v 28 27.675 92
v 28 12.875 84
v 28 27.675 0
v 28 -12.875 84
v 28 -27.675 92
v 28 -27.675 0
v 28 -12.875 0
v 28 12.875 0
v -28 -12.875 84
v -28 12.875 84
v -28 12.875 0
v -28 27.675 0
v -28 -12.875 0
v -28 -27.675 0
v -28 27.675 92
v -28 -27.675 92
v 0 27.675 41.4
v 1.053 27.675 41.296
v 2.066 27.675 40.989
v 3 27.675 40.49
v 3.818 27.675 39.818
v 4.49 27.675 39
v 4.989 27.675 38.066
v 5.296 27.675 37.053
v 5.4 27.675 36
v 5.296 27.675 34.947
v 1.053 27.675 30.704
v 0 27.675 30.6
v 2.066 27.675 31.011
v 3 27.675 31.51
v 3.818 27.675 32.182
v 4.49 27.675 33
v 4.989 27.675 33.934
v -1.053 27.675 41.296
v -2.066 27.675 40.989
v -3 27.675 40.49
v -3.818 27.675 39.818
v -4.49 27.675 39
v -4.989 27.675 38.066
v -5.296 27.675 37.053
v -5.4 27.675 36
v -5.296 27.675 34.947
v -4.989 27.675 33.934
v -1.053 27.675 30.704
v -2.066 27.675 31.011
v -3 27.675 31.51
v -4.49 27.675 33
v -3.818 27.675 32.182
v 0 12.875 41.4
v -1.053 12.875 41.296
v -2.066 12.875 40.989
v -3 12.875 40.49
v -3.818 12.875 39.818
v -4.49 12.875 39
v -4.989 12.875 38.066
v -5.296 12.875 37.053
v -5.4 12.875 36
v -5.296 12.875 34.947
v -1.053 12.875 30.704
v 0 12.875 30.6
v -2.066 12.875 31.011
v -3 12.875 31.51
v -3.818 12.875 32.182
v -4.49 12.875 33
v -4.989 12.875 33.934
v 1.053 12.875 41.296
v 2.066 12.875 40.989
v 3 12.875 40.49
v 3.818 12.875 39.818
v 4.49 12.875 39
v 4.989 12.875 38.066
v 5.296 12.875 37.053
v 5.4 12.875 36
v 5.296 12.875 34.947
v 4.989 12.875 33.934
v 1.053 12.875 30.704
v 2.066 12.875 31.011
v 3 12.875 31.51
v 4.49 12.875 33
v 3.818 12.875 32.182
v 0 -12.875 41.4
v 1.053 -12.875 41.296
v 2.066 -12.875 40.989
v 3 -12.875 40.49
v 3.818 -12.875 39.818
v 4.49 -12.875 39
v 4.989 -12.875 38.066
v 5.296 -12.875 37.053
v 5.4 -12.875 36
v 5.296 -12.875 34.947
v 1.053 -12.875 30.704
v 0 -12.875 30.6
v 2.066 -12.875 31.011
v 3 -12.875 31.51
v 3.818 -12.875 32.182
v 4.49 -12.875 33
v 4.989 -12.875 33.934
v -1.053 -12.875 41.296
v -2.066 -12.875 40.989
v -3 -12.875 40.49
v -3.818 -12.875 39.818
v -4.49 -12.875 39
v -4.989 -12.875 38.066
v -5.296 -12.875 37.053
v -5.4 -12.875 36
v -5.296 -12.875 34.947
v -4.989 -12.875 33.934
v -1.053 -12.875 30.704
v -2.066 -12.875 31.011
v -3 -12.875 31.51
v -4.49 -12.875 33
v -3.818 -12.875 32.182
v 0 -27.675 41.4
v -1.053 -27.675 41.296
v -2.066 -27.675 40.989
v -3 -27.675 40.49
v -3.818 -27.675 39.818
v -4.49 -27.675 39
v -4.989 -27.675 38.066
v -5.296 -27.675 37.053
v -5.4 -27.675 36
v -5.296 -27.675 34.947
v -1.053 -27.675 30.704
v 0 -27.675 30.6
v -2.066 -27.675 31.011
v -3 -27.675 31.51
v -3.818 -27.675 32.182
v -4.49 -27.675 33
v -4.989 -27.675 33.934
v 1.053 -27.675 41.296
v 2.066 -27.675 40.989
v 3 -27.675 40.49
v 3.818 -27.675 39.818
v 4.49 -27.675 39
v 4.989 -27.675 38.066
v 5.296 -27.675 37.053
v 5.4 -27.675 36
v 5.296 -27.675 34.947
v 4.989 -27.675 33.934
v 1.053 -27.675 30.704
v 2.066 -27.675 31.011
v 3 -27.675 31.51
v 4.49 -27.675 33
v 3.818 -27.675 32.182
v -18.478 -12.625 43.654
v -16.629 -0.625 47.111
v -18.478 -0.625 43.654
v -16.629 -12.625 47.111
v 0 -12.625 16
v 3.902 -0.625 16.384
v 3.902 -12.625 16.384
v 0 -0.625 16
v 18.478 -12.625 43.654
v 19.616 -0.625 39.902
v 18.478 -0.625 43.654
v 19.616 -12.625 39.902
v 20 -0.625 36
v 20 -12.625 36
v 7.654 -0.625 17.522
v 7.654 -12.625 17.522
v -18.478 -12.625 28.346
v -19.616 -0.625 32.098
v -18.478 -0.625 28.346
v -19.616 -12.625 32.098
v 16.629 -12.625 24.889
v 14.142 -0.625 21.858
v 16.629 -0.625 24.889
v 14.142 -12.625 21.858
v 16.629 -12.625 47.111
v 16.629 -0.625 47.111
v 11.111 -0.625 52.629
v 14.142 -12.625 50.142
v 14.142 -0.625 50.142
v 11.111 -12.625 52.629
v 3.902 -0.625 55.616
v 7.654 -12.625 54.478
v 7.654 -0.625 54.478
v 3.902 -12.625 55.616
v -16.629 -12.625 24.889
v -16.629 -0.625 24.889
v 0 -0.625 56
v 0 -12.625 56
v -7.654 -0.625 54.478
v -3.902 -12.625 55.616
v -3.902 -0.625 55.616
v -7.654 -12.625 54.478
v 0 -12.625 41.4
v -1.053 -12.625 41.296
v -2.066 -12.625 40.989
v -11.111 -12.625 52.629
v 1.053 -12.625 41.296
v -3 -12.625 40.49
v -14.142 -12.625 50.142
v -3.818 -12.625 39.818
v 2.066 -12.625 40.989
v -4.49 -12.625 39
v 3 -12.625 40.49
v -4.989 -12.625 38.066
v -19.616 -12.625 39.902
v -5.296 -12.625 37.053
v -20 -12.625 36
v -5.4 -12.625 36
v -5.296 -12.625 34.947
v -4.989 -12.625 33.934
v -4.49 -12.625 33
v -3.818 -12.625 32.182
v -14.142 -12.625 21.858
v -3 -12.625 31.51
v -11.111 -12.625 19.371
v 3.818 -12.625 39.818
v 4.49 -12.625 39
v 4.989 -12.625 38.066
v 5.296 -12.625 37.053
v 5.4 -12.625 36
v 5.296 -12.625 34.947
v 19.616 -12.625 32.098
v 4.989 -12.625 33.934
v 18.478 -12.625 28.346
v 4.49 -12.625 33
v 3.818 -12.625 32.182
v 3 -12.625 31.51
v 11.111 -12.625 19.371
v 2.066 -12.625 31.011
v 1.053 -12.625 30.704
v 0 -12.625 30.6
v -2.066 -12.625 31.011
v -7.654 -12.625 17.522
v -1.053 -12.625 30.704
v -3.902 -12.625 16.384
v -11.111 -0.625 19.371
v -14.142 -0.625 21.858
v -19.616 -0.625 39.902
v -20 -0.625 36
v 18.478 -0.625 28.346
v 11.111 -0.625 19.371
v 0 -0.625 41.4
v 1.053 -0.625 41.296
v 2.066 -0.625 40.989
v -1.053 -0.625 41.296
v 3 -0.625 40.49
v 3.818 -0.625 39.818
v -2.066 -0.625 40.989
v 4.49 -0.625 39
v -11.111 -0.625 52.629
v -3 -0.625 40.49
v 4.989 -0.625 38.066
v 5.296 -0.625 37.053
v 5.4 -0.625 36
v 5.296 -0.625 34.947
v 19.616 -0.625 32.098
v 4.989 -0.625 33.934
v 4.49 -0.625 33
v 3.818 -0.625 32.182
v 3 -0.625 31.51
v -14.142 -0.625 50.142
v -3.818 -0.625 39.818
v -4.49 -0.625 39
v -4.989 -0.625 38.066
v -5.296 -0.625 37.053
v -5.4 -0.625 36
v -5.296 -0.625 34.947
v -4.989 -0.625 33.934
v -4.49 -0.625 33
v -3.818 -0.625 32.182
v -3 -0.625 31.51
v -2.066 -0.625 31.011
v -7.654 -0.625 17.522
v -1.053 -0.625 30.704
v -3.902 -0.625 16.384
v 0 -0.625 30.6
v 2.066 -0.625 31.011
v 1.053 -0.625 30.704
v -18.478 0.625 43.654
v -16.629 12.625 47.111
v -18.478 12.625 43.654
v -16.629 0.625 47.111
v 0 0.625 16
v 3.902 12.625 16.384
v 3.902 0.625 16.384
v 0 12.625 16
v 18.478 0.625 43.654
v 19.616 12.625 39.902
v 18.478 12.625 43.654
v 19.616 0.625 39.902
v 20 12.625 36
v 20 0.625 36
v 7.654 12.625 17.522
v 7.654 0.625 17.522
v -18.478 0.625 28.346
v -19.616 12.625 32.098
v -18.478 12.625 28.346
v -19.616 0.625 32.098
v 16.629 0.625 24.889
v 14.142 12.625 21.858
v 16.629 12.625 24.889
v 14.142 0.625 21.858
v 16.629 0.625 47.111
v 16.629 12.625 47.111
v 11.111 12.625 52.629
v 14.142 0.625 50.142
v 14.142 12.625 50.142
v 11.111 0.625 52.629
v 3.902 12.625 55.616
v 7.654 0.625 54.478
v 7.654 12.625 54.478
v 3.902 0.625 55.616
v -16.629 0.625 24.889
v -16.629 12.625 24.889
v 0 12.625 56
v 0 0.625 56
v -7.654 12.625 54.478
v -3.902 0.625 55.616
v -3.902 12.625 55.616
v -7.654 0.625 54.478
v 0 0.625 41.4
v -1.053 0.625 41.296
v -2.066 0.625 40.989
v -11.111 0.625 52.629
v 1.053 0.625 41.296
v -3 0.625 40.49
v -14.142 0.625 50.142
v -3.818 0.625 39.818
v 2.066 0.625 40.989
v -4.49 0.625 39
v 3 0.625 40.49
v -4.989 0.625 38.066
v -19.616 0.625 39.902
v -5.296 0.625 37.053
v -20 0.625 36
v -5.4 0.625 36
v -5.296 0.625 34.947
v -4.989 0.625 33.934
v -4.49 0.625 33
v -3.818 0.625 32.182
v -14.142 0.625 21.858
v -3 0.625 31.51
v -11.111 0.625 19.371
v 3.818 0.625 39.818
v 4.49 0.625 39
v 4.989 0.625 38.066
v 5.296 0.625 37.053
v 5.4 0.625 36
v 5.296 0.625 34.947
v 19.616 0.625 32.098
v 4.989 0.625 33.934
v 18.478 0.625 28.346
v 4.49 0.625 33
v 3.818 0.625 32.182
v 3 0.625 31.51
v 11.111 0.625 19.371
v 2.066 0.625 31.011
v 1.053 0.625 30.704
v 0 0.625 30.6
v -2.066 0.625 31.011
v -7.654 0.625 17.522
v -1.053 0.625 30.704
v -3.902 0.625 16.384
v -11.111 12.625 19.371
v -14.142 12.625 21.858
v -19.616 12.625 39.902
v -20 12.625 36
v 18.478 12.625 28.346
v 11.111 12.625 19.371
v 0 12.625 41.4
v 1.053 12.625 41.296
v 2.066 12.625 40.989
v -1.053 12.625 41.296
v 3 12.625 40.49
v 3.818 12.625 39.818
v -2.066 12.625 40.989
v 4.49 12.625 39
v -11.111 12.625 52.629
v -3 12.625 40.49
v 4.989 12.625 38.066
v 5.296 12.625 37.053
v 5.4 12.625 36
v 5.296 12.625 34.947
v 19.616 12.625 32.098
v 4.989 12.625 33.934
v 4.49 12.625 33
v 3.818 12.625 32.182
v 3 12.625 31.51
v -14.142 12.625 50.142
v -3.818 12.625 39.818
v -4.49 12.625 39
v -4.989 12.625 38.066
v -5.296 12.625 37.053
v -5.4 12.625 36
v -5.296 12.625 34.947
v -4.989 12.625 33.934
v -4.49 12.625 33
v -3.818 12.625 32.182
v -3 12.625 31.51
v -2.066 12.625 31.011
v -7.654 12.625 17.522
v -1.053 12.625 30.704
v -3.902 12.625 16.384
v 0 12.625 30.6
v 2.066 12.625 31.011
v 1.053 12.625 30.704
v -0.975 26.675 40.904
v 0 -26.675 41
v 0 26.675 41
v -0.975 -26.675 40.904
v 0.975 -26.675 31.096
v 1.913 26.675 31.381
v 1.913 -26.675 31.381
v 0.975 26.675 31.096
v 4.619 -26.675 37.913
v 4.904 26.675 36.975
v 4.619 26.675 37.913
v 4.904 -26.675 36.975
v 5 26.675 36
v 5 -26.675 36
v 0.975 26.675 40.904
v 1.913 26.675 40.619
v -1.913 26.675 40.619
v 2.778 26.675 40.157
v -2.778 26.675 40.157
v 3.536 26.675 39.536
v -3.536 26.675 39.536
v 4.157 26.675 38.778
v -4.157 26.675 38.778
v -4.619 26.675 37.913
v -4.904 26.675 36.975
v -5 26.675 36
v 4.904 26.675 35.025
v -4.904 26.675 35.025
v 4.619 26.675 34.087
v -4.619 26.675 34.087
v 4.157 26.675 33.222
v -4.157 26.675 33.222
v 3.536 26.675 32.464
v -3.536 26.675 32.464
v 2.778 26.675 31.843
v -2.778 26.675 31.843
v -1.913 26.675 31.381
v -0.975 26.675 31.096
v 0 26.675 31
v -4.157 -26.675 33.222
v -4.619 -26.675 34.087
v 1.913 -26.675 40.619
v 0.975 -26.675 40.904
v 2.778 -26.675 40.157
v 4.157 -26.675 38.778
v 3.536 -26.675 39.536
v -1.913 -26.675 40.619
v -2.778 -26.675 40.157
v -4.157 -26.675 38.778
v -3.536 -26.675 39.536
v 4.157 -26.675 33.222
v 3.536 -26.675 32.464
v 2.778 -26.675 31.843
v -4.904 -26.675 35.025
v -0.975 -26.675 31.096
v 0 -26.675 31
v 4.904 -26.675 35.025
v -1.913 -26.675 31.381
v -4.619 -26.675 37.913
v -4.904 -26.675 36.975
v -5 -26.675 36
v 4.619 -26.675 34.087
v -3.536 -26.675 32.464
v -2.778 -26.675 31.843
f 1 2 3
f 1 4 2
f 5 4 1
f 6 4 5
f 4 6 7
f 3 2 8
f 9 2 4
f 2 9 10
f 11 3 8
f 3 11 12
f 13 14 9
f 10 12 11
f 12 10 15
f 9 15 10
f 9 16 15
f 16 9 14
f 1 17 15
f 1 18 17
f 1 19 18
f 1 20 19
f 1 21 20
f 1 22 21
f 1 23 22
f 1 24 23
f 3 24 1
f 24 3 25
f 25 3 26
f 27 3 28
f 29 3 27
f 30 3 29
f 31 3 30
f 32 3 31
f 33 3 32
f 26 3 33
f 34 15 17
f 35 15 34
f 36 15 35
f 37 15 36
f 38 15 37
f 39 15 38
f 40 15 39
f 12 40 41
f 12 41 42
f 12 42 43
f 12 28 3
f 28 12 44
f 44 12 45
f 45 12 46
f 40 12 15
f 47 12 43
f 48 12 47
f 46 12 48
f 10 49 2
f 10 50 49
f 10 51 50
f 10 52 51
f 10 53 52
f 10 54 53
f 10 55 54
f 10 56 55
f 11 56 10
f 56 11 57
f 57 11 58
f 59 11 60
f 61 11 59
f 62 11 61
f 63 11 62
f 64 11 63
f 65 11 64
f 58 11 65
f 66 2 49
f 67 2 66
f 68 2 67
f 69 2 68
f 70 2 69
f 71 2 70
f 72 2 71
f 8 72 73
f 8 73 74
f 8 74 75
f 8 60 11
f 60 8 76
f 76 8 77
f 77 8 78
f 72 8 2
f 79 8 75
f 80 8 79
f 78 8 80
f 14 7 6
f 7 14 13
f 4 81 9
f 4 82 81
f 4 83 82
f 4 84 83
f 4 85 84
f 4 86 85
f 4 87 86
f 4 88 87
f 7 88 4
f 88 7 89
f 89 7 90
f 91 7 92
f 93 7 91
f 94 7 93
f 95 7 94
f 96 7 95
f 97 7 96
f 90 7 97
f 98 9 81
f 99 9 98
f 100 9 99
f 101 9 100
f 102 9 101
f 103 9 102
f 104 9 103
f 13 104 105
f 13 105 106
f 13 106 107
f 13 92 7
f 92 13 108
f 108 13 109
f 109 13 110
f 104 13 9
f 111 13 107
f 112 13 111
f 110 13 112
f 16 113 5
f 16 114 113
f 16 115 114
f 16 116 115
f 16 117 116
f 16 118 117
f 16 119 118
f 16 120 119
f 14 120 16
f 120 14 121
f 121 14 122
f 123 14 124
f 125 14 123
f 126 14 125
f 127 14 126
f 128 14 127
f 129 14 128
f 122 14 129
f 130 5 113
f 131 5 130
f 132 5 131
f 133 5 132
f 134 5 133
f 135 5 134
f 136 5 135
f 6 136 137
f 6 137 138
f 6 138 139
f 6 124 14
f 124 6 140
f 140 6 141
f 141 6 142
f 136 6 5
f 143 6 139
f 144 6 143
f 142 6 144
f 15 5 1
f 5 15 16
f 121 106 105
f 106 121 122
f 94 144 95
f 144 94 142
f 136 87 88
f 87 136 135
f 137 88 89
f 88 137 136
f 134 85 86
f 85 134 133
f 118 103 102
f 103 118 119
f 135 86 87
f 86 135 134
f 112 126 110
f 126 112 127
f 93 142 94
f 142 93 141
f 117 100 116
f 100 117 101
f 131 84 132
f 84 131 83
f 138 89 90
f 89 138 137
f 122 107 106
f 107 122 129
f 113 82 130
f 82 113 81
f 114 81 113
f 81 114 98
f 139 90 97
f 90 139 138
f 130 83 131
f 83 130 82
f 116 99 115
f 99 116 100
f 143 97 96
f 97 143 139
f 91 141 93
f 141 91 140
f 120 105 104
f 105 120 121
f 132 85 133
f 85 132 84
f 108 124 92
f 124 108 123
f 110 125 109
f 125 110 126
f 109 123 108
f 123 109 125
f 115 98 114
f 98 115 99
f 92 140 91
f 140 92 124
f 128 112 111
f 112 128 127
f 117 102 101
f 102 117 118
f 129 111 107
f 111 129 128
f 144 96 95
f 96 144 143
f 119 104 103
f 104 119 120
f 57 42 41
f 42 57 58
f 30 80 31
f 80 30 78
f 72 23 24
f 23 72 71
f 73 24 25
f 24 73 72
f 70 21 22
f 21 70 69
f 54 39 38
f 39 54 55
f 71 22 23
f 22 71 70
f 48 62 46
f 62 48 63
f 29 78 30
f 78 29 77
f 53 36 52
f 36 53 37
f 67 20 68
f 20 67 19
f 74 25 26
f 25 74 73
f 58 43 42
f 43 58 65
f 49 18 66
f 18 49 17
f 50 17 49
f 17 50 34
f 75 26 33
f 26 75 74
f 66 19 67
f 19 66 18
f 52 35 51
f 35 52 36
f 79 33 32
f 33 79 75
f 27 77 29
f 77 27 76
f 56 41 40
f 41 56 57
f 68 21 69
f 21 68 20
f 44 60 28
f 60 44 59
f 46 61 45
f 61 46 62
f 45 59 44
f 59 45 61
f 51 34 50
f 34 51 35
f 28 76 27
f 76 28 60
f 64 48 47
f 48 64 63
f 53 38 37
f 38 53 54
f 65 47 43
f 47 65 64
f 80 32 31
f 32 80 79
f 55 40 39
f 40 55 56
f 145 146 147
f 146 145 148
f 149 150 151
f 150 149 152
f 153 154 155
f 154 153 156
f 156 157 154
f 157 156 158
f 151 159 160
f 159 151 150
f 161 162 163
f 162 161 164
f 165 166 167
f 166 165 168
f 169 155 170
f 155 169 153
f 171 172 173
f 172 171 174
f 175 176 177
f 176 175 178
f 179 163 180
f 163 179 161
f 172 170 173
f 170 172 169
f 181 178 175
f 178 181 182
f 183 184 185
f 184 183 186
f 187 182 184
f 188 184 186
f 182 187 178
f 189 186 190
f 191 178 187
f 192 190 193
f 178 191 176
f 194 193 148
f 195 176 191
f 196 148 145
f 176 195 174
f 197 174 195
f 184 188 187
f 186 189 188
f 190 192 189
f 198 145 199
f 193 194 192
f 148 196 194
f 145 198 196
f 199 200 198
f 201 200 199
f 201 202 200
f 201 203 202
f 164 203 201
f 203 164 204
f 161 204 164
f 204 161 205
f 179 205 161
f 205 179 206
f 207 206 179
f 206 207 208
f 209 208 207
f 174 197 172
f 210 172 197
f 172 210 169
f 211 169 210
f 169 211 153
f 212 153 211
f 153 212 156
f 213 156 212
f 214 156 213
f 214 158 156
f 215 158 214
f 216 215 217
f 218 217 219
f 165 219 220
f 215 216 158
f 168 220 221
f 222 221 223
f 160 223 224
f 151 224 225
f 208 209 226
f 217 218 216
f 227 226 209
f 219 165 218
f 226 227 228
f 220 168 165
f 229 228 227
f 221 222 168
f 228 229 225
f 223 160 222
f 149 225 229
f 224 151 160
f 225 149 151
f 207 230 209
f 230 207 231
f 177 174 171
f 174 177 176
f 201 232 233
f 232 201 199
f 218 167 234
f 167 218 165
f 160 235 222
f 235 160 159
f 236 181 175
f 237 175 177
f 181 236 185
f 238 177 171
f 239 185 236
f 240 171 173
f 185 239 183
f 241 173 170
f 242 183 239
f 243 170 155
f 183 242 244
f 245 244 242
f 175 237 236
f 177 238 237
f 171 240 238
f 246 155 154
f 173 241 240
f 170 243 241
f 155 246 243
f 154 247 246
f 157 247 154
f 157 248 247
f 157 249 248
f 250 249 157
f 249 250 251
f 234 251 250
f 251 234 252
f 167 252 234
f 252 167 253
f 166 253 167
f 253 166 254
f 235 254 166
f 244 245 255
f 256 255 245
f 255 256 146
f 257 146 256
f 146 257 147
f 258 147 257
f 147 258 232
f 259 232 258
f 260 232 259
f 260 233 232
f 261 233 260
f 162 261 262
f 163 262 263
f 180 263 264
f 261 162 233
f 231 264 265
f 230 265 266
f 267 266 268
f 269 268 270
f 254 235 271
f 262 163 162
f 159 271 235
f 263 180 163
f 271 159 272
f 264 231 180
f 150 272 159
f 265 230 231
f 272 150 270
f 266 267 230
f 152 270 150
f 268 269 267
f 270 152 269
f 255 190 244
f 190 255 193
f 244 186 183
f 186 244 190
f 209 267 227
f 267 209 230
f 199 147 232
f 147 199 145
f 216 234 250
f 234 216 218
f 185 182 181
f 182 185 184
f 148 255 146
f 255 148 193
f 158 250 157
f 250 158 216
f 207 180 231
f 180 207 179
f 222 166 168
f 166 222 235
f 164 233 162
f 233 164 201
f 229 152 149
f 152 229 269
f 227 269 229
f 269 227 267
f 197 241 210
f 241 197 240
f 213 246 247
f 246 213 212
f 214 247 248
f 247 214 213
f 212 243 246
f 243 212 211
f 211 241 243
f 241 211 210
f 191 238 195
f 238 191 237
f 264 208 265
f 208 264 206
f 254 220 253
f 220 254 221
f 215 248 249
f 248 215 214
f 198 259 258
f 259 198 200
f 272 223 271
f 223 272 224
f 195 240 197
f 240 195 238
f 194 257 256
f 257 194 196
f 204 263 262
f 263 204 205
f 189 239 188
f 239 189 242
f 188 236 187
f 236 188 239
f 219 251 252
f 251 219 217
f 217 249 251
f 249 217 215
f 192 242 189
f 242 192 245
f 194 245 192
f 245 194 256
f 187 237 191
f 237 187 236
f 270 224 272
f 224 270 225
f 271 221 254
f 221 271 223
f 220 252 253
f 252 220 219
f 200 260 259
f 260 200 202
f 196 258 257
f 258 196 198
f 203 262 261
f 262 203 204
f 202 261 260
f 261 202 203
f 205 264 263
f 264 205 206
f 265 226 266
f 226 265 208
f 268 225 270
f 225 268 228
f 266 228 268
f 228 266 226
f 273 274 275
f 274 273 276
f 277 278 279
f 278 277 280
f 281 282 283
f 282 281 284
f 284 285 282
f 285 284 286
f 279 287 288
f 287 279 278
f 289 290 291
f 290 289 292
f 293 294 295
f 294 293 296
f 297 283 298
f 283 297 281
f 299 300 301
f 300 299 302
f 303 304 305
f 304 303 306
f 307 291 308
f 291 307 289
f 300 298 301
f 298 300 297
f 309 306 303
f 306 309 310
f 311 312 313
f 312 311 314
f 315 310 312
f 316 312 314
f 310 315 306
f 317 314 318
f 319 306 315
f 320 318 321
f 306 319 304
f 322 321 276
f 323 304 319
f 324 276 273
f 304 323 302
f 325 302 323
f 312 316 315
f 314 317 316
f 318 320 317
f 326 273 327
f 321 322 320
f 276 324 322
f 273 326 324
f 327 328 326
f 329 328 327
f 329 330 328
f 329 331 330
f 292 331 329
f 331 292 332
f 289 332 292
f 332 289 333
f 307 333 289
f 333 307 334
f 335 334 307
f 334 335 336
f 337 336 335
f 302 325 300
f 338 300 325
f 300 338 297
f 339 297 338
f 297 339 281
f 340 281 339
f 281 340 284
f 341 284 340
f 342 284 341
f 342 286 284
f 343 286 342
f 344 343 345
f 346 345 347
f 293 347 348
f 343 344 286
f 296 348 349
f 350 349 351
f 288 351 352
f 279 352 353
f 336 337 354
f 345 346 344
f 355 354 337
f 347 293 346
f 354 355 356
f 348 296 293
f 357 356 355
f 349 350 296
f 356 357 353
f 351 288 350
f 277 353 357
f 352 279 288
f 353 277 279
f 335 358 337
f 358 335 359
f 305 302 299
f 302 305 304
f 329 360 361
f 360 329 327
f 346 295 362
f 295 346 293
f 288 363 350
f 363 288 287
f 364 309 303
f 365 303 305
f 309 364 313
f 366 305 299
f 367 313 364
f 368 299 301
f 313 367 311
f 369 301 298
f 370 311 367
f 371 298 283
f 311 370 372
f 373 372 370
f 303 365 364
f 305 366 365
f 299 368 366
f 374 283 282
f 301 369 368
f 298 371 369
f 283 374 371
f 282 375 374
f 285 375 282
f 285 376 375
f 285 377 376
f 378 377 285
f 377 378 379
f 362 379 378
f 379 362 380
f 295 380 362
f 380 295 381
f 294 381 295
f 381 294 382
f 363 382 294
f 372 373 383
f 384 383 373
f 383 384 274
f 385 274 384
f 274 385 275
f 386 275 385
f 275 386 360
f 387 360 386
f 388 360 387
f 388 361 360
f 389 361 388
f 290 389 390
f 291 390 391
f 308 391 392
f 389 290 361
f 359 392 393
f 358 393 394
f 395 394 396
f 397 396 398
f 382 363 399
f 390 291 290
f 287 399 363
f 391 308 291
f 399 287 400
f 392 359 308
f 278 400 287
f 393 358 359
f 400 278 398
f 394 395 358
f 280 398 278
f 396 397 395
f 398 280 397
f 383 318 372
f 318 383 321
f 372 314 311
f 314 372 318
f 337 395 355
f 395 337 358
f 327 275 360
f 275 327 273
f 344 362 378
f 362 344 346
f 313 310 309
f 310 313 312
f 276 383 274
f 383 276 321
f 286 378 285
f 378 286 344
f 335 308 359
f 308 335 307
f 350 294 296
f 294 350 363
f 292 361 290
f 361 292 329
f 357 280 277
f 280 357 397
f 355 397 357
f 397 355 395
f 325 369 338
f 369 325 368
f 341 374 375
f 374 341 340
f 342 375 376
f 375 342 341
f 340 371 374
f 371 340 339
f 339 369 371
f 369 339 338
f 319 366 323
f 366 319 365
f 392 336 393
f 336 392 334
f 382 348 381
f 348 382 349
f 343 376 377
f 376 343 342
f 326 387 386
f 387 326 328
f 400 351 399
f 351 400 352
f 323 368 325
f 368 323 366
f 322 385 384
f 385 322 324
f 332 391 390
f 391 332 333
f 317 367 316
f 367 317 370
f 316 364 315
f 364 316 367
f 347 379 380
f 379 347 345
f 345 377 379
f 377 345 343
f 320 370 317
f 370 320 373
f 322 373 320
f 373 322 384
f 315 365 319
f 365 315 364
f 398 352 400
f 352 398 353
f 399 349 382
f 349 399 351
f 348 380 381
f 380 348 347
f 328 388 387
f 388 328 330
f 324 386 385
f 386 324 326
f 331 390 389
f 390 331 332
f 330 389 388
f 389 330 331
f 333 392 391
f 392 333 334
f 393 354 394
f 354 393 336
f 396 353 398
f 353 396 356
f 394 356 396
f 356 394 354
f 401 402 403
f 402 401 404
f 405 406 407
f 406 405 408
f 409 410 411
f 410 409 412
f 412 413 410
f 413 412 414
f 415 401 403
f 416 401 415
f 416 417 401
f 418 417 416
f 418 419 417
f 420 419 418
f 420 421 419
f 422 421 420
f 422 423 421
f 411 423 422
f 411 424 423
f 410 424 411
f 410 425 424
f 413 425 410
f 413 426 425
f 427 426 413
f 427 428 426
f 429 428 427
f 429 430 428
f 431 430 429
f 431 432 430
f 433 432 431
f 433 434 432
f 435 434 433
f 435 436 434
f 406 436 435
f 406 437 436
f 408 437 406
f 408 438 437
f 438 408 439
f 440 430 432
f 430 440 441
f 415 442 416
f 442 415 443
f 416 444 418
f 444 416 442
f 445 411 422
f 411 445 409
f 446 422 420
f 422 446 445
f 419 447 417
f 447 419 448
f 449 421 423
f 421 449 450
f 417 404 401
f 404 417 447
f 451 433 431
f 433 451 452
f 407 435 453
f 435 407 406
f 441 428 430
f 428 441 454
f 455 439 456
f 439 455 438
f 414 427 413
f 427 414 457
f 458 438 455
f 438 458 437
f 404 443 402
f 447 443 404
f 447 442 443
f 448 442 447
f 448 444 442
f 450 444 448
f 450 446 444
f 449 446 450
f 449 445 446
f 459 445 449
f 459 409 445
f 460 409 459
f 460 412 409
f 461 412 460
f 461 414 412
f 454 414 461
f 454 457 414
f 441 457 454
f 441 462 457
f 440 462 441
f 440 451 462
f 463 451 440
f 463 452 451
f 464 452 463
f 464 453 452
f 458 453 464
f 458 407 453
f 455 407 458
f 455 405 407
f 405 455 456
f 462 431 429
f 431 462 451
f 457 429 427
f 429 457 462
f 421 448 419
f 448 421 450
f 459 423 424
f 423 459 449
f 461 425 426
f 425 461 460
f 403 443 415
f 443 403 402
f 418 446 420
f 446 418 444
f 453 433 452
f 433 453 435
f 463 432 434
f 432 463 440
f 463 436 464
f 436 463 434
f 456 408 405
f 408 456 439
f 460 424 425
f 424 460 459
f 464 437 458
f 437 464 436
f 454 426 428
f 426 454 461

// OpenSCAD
$fn = 32;

// ------------------------------------------------------------------------
// Trolley wheel set: wheels d40, fork 84 mm tall
// Every part is its own module, assembly() places every instance.
// ------------------------------------------------------------------------

// --- part 1 ---
module trolley_fork() {
  difference() {
    union() {
      translate([-28, 12.875, 0]) cube([56, 14.8, 84]);
      translate([-28, -27.675, 0]) cube([56, 14.8, 84]);
      translate([-28, -27.675, 84]) cube([56, 55.35, 8]);
    }
    translate([0, -20.275, 36]) rotate([90, 0, 0]) cylinder(h = 16.8, d = 10.8, center = true);
    translate([0, 20.275, 36]) rotate([90, 0, 0]) cylinder(h = 16.8, d = 10.8, center = true);
  }
}

// --- part 2 ---
module trolley_wheel() {
  difference() {
      translate([0, 0, 0]) cylinder(h = 12, d = 40);
      translate([0, 0, -1]) cylinder(h = 14, d = 10.8);
    }
}

// --- part 3 ---
module trolley_axle() {
  translate([0, 0, -26.675]) cylinder(h = 53.35, d = 10);
}

// --- assembly ---
module assembly() {
  color([0.80, 0.24, 0.20]) translate([0, 0, 0]) rotate([0, 0, 0]) trolley_fork();
  color([0.20, 0.45, 0.75]) translate([0, -0.625, 36]) rotate([90, 0, 0]) trolley_wheel();
  color([0.25, 0.62, 0.32]) translate([0, 12.625, 36]) rotate([90, 0, 0]) trolley_wheel();
  color([0.92, 0.70, 0.18]) translate([0, 0, 36]) rotate([90, 0, 0]) trolley_axle();
}

assembly();
